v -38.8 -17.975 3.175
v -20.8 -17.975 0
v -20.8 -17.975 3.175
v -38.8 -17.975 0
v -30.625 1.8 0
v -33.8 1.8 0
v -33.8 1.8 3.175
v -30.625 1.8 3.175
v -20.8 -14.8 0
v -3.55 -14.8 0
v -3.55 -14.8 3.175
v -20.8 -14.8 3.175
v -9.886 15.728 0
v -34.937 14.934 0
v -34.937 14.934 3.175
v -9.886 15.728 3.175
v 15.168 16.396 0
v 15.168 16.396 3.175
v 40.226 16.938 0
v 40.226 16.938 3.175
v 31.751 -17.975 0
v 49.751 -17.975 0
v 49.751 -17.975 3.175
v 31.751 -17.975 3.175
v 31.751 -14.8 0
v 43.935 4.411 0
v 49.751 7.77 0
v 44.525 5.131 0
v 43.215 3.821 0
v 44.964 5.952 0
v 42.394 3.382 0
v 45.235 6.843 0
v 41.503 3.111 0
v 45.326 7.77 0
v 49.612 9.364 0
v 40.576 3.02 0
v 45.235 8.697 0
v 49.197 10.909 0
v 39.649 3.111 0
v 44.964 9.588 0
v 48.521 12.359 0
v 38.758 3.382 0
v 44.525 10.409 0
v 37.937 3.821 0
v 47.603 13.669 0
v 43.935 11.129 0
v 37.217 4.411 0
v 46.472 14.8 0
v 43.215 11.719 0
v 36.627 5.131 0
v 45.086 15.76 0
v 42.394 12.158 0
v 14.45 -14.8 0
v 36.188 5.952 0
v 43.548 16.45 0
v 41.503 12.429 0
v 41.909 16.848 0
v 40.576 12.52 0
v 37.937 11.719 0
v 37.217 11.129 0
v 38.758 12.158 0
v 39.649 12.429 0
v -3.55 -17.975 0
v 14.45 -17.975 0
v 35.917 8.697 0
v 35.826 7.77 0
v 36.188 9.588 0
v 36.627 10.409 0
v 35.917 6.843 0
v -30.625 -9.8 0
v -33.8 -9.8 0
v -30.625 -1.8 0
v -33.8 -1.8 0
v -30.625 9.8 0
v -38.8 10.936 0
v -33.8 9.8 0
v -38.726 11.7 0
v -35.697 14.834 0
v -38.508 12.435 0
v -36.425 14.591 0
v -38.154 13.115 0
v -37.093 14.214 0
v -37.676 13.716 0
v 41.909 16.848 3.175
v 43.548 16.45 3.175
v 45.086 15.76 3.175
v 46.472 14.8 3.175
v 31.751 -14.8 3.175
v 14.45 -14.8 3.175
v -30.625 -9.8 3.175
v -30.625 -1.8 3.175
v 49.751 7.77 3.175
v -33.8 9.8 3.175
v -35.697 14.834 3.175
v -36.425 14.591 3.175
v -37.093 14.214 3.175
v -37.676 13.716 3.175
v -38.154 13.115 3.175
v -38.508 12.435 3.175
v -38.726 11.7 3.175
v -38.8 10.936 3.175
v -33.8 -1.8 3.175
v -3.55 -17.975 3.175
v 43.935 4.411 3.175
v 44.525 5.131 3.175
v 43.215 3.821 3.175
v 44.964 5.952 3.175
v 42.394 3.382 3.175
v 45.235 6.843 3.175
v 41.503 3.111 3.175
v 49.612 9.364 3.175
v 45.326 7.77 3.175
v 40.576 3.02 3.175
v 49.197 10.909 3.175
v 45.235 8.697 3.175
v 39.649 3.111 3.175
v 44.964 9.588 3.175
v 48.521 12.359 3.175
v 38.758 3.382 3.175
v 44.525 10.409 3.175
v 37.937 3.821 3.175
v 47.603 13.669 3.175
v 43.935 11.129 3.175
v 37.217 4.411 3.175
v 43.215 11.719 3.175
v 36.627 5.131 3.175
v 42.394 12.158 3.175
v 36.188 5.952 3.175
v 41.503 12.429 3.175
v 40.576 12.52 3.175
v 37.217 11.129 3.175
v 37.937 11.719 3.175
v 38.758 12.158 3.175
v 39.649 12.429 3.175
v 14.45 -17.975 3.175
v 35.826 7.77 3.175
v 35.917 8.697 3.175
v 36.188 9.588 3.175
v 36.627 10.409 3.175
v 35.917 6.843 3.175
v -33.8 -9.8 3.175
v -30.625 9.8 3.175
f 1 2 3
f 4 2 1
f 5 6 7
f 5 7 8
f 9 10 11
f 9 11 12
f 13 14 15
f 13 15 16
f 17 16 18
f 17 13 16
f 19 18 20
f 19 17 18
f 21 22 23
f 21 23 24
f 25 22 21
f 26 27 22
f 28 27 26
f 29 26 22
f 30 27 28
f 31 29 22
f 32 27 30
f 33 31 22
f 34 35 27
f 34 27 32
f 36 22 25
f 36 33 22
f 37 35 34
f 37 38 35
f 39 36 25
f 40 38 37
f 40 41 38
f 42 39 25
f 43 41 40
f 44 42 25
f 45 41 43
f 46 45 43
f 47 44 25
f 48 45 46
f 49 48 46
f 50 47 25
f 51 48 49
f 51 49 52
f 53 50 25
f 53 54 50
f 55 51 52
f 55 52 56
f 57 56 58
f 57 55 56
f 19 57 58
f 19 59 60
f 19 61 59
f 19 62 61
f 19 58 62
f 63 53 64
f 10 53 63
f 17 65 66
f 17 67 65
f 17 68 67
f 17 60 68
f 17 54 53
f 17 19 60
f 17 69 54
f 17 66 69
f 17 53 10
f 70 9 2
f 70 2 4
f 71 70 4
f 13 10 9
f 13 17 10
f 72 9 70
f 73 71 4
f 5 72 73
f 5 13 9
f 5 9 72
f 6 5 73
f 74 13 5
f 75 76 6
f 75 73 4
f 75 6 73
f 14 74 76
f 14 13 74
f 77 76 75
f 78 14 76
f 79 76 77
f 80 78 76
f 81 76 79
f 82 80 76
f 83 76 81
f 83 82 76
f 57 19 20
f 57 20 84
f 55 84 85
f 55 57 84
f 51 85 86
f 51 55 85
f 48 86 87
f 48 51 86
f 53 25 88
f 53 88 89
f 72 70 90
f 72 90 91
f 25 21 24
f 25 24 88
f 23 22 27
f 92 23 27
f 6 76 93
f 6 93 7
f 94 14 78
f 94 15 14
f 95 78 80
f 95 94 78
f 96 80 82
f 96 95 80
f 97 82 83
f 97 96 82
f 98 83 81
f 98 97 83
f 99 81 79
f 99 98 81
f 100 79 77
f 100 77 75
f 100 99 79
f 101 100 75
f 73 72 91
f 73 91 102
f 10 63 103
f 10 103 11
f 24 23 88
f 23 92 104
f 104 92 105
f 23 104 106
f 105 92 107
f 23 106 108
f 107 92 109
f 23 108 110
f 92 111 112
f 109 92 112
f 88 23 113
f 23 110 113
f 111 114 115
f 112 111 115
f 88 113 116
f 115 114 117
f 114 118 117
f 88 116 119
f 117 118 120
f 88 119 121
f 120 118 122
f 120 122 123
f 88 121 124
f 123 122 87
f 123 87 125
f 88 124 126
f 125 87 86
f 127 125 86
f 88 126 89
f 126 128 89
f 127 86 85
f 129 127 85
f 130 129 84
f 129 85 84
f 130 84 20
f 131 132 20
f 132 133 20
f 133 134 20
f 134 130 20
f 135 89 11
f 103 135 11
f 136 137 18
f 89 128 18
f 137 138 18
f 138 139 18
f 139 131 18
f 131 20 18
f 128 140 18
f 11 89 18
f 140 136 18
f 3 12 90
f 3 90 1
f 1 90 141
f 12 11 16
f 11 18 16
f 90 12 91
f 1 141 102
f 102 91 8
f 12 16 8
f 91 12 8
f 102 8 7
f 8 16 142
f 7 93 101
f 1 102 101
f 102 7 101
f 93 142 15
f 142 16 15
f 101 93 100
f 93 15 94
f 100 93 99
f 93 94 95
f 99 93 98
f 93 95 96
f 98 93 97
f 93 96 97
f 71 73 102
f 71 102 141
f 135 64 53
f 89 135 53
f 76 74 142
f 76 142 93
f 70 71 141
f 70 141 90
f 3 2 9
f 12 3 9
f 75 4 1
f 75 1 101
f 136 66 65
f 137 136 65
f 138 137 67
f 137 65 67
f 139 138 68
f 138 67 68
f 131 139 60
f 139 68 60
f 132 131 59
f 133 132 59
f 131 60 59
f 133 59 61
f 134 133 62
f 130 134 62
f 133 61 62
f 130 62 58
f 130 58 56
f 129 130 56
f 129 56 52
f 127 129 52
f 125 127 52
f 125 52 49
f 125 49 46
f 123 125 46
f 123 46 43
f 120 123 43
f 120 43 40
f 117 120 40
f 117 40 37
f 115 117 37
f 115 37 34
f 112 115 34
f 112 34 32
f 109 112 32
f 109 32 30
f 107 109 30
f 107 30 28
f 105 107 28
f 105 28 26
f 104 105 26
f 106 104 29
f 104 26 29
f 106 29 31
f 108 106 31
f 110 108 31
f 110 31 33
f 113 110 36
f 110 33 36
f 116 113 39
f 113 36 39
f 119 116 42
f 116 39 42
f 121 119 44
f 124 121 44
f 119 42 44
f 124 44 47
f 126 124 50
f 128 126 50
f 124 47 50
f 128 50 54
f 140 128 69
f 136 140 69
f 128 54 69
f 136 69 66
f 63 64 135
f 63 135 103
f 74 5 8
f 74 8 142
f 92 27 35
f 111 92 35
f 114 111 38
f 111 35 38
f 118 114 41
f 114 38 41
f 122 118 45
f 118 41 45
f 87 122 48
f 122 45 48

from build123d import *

# Parameters (mm, degrees)
SKETCH1_W            = 6.266
SKETCH1_H            = 19.6
SKETCH1_R            = 1.675
SKETCH1_W_2          = 52.832
SKETCH1_H_2          = 5
BOSS_EXTRUDE2_DEPTH  = 3.175
SKETCH3_W            = 30
SKETCH3_H            = 29.6
BOSS_EXTRUDE3_DEPTH  = 3.175
SKETCH4_R            = 4.75
CUT_EXTRUDE1_DEPTH   = 10
BOSS_EXTRUDE14_DEPTH = 3.175
CUT_EXTRUDE8_DEPTH   = 10
BOSS_EXTRUDE15_DEPTH = 3.175
BOSS_EXTRUDE16_DEPTH = 3.175
BOSS_EXTRUDE17_DEPTH = 3.175
FILLET5_R            = 4
SKETCH27_W           = 3.175
SKETCH27_H           = 8
CUT_EXTRUDE9_DEPTH   = 10
SKETCH28_W           = 18
SKETCH28_H           = 3.175
BOSS_EXTRUDE18_DEPTH = 3.175
SKETCH29_W           = 53.813797415
SKETCH29_H           = 23.475817665
BOSS_EXTRUDE19_DEPTH = 3.175
SKETCH30_W           = 8.216536182
SKETCH30_H           = 11.169409555
BOSS_EXTRUDE20_DEPTH = 3.175


with BuildPart() as part:
    # Sketch1 → Boss-Extrude2 (new body)
    # profile 1 of 4: a face of its own
    with BuildSketch(Plane.XY):
        with Locations((-23.283, 0)):
            Rectangle(SKETCH1_W, SKETCH1_H)
        with Locations((-23.95, -4.974)):
            Circle(SKETCH1_R, mode=Mode.SUBTRACT)
        with Locations((-23.95, 4.974)):
            Circle(SKETCH1_R, mode=Mode.SUBTRACT)
    # profile 2 of 4: a face of its own
    with BuildSketch(Plane.XY):
        with Locations((23.283, 0)):
            Rectangle(SKETCH1_W, SKETCH1_H)
        with Locations((23.95, -4.974)):
            Circle(SKETCH1_R, mode=Mode.SUBTRACT)
        with Locations((23.95, 4.974)):
            Circle(SKETCH1_R, mode=Mode.SUBTRACT)
    # profile 3 of 4: a face of its own
    with BuildSketch(Plane.XY):
        with Locations((0, 12.3)):
            Rectangle(SKETCH1_W_2, SKETCH1_H_2)
    # profile 4 of 4: a face of its own
    with BuildSketch(Plane.XY):
        with Locations((0, -12.3)):
            Rectangle(SKETCH1_W_2, SKETCH1_H_2)
    extrude(amount=BOSS_EXTRUDE2_DEPTH)

    # Sketch3 → Boss-Extrude3 (add)
    with BuildSketch(Plane.XY.offset(3.175)):
        with Locations((41.416, 0)):
            Rectangle(SKETCH3_W, SKETCH3_H)
    extrude(amount=-BOSS_EXTRUDE3_DEPTH)

    # Sketch4 → Cut-Extrude1 (cut)
    with BuildSketch(Plane(origin=(0, 0, 0), x_dir=(-1, 0, 0), z_dir=(0, 0, -1))):
        with Locations((-40.576, 7.77)):
            Circle(SKETCH4_R)
    extrude(amount=-CUT_EXTRUDE1_DEPTH, mode=Mode.SUBTRACT)

    # Sketch22 → Boss-Extrude14 (add)
    with BuildSketch(Plane(origin=(0, 0, 0), x_dir=(-1, 0, 0), z_dir=(0, 0, -1))):
        with BuildLine():
            ThreePointArc((-34.680262133, 14.8), (-40.576, 16.945), (-46.471737867, 14.8))
            Line((-46.471737867, 14.8), (-34.680262133, 14.8))
        make_face()
    extrude(amount=-BOSS_EXTRUDE14_DEPTH)

    # Sketch23 → Cut-Extrude8 (cut)
    with BuildSketch(Plane(origin=(0, 0, 0), x_dir=(-1, 0, 0), z_dir=(0, 0, -1))):
        with BuildLine():
            Line((-49.751, -14.8), (-49.751, 7.77))
            ThreePointArc((-49.751, 7.77), (-48.890866804, 11.648609936), (-46.471737867, 14.8))
            Line((-46.471737867, 14.8), (-56.416, 14.8))
            Line((-56.416, 14.8), (-56.416, -14.8))
            Line((-56.416, -14.8), (-49.751, -14.8))
        make_face()
    extrude(amount=-CUT_EXTRUDE8_DEPTH, mode=Mode.SUBTRACT)

    # Sketch24 → Boss-Extrude15 (add)
    with BuildSketch(Plane(origin=(0, 0, 0), x_dir=(-1, 0, 0), z_dir=(0, 0, -1))):
        Polygon((30.625, 14.8), (26.416, 14.8), (26.416, -14.8), (27.751006616, -14.8), (30.625, -14.8), align=None)
    extrude(amount=-BOSS_EXTRUDE15_DEPTH)

    # Sketch25 → Boss-Extrude16 (add)
    with BuildSketch(Plane(origin=(0, 0, 0), x_dir=(-1, 0, 0), z_dir=(0, 0, -1))):
        Polygon((30.625, 14.8), (30.625, 9.8), (33.8, 9.8), (33.8, 1.8), (30.625, 1.8), (30.625, -1.8), (33.8, -1.8), (33.8, -9.8), (30.625, -9.8), (30.625, -14.8), (31.879074074, -14.8), (38.8, -14.8), (38.8, 14.8), align=None)
    extrude(amount=-BOSS_EXTRUDE16_DEPTH)

    # Sketch26 → Boss-Extrude17 (add)
    with BuildSketch(Plane(origin=(0, 0, 0), x_dir=(-1, 0, 0), z_dir=(0, 0, -1))):
        with BuildLine():
            ThreePointArc((-40.225848077, 16.938316019), (-37.275108655, 16.330650754), (-34.680262133, 14.8))
            Line((-34.680262133, 14.8), (38.8, 14.8))
            ThreePointArc((38.8, 14.8), (-0.708684686, 16.025831975), (-40.225848077, 16.938316019))
        make_face()
    extrude(amount=-BOSS_EXTRUDE17_DEPTH)

    # Fillet5
    fillet5_edges = [part.edges().sort_by_distance(p)[0] for p in [
        (-38.8, 14.8, 1.5875),
    ]]
    fillet(fillet5_edges, radius=FILLET5_R)

    # Sketch27 → Cut-Extrude9 (cut)
    with BuildSketch(Plane(origin=(0, 0, 0), x_dir=(-1, 0, 0), z_dir=(0, 0, -1))):
        with Locations((-43.1635, -5.8)):
            Rectangle(SKETCH27_W, SKETCH27_H)
    extrude(amount=-CUT_EXTRUDE9_DEPTH, mode=Mode.SUBTRACT)

    # Sketch28 → Boss-Extrude18 (add)
    with BuildSketch(Plane(origin=(0, 0, 0), x_dir=(-1, 0, 0), z_dir=(0, 0, -1))):
        with Locations((-40.751, -16.3875)):
            Rectangle(SKETCH28_W, SKETCH28_H)
        with Locations((-5.45, -16.3875)):
            Rectangle(SKETCH28_W, SKETCH28_H)
        with Locations((29.8, -16.3875)):
            Rectangle(SKETCH28_W, SKETCH28_H)
    extrude(amount=-BOSS_EXTRUDE18_DEPTH)

    # Sketch29 → Boss-Extrude19 (add)
    with BuildSketch(Plane(origin=(0, 0, 0), x_dir=(-1, 0, 0), z_dir=(0, 0, -1))):
        with Locations((0.393454416, 0.74908249)):
            Rectangle(SKETCH29_W, SKETCH29_H)
    extrude(amount=-BOSS_EXTRUDE19_DEPTH)

    # Sketch30 → Boss-Extrude20 (add)
    with BuildSketch(Plane(origin=(0, 0, 0), x_dir=(-1, 0, 0), z_dir=(0, 0, -1))):
        with Locations((-41.72757997, -5.584704778)):
            Rectangle(SKETCH30_W, SKETCH30_H)
    extrude(amount=-BOSS_EXTRUDE20_DEPTH)


solid = part.part
